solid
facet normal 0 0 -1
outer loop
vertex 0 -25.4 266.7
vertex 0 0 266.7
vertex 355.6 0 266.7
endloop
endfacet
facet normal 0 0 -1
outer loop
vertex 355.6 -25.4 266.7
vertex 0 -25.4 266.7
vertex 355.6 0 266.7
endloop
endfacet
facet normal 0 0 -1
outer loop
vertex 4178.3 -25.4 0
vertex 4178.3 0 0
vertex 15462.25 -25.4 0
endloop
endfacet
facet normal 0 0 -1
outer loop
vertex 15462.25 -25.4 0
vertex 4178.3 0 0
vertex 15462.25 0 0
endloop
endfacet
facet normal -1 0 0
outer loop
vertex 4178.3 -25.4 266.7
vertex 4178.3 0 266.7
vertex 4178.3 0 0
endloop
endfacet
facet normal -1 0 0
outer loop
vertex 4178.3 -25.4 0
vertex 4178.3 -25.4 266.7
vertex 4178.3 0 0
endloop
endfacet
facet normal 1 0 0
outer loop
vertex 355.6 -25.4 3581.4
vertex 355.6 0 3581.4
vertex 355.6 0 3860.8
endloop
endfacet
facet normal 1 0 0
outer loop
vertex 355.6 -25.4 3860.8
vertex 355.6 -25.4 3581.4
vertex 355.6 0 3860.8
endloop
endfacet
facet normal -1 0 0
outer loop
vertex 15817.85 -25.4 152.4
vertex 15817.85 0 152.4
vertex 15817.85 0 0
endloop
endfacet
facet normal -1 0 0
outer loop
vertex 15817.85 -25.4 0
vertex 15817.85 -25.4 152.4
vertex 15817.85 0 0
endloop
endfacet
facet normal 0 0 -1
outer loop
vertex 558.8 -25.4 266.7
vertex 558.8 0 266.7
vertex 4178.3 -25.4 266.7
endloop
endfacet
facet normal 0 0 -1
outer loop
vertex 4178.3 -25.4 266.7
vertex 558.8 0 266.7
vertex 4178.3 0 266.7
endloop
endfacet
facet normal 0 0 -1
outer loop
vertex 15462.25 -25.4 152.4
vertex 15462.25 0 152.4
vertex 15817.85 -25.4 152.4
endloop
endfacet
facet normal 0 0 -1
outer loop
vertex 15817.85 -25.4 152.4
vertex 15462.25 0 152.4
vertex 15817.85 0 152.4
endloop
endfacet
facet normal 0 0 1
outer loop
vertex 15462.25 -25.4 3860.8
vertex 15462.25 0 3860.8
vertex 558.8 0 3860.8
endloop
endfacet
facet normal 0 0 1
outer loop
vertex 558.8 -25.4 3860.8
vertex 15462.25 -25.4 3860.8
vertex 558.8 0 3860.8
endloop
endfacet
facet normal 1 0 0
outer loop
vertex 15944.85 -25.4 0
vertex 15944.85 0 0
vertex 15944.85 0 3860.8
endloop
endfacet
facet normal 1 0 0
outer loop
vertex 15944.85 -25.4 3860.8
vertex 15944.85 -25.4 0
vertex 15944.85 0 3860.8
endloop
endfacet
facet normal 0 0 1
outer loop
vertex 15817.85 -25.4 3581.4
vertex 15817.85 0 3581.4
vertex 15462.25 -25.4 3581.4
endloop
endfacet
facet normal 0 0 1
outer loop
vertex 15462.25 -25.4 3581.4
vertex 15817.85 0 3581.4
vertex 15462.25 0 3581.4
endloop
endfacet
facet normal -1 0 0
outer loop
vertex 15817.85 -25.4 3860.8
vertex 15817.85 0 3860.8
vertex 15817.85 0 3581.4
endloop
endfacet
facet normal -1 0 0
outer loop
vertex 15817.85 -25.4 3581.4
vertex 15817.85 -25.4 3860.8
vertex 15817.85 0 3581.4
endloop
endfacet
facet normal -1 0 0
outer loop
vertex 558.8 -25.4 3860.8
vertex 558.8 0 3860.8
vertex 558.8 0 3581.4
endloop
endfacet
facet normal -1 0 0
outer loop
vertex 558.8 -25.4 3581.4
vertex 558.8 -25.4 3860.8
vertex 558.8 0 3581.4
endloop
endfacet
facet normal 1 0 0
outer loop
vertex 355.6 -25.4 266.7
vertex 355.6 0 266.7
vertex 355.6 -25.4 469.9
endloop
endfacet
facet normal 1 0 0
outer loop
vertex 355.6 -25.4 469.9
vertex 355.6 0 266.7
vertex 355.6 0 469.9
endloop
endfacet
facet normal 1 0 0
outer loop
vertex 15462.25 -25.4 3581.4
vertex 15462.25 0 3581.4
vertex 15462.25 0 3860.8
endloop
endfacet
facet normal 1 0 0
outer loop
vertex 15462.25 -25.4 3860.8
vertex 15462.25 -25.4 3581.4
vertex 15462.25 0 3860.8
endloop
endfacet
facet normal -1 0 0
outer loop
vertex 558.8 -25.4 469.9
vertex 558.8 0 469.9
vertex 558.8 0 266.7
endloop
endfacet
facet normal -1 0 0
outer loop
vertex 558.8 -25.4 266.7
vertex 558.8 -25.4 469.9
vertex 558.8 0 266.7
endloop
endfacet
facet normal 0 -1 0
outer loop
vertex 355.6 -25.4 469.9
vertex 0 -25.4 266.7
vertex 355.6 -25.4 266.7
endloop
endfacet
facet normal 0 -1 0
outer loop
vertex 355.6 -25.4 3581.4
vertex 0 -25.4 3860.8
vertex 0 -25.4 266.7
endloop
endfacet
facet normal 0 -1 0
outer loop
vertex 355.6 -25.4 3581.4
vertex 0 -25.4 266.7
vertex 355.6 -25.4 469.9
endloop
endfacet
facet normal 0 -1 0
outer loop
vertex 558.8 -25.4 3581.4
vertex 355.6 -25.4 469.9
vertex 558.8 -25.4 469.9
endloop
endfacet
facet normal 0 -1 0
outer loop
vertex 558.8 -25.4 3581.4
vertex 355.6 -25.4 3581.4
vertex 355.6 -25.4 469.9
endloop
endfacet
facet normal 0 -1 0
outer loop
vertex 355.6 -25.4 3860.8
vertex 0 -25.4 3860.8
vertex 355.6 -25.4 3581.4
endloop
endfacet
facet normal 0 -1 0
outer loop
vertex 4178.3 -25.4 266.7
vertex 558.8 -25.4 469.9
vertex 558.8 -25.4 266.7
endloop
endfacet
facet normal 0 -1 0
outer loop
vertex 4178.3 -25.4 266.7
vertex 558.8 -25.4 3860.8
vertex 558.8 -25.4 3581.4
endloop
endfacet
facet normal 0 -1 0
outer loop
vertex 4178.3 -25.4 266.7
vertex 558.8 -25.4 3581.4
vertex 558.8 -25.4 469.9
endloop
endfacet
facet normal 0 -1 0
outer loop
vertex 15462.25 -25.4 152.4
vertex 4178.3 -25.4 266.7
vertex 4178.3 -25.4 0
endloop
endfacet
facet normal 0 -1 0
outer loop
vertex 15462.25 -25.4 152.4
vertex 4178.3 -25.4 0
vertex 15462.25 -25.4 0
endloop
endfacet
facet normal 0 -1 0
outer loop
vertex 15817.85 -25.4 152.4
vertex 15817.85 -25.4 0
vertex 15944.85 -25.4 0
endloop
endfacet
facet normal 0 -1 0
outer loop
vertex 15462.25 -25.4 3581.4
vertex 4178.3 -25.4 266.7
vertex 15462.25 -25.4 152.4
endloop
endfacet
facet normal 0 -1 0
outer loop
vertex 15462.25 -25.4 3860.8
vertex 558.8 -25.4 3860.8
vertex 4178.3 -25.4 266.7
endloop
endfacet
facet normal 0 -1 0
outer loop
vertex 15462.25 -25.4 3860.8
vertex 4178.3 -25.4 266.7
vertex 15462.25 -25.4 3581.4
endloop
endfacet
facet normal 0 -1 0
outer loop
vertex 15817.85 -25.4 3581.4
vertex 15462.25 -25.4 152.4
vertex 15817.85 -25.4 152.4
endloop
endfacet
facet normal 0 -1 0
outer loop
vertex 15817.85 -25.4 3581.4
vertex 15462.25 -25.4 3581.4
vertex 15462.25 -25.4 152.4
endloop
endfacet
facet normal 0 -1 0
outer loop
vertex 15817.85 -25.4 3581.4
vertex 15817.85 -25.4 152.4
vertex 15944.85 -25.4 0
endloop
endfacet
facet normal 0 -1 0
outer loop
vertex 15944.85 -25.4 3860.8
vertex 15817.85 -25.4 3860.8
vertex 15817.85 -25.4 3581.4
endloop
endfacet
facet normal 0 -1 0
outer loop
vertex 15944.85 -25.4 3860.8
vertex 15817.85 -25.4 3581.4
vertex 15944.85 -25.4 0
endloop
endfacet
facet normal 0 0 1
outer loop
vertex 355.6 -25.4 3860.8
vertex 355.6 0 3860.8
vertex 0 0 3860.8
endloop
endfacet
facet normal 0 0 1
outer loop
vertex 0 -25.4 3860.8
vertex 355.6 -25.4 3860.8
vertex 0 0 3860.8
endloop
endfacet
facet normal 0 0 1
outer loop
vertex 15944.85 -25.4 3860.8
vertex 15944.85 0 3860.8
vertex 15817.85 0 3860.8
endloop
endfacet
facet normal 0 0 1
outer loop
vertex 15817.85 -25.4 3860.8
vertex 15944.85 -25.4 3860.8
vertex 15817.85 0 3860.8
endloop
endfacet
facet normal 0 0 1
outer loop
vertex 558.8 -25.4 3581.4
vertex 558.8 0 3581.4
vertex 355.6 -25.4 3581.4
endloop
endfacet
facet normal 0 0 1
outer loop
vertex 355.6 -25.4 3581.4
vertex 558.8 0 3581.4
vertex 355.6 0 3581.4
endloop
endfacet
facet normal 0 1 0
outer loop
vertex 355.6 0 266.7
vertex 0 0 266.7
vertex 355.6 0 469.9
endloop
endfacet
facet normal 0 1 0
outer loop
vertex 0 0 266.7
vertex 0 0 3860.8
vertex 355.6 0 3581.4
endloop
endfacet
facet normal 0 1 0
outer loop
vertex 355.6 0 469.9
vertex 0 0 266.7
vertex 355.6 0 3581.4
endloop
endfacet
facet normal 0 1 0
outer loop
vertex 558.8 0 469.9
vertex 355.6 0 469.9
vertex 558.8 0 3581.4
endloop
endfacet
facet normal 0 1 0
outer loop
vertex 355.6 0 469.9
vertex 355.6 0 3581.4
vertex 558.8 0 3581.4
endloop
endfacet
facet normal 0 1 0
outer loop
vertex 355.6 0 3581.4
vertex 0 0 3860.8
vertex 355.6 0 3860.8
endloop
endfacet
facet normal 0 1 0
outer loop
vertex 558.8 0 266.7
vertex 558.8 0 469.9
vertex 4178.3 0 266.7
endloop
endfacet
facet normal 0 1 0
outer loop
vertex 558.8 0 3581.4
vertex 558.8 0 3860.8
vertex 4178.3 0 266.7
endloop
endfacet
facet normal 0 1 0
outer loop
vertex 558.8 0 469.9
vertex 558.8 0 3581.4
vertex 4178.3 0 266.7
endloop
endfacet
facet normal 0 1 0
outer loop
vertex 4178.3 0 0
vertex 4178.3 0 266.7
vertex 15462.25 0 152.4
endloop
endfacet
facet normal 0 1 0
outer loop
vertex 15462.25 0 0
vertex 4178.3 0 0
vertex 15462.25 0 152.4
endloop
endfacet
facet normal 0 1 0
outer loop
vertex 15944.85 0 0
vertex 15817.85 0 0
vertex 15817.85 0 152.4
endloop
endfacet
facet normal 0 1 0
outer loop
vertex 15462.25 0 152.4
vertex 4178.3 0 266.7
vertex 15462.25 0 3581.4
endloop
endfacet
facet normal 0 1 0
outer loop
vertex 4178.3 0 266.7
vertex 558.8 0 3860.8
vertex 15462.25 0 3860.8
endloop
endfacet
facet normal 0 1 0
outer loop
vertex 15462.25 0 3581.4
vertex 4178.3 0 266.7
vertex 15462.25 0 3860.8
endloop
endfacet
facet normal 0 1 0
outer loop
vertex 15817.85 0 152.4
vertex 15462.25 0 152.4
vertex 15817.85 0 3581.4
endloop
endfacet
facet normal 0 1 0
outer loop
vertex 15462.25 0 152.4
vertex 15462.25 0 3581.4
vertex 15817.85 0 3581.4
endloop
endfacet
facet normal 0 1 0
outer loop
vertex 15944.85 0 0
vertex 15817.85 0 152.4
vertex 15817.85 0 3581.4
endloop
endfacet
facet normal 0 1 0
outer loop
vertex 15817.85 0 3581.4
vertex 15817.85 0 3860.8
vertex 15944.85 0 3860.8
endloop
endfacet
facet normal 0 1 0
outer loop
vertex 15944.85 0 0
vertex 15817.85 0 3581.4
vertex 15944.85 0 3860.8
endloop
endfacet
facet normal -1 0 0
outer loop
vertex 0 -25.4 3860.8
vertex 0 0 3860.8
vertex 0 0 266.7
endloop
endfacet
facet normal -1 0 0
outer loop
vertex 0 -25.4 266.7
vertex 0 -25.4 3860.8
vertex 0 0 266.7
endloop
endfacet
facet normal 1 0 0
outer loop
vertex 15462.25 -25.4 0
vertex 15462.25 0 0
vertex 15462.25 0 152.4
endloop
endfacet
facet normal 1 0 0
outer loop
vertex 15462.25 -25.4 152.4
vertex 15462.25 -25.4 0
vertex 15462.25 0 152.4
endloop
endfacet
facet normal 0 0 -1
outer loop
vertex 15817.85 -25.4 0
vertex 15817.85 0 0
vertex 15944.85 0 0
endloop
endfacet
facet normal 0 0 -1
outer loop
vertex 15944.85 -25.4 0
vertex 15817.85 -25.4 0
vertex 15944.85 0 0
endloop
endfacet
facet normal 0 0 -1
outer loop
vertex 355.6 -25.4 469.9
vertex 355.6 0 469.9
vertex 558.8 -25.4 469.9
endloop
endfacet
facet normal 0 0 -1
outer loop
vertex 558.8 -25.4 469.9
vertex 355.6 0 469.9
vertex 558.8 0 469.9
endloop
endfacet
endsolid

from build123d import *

# Parameters (mm, degrees)
F1_DEPTH = 25.4


with BuildPart() as f1:
    # F0 (on Front) → F1 (new body)
    with BuildSketch(Plane.XZ):
        Polygon((355.6, 3860.8), (0, 3860.8), (0, 266.7), (355.6, 266.7), (355.6, 469.9), (558.8, 469.9), (558.8, 266.7), (4178.3, 266.7), (4178.3, 0), (15462.25, 0), (15462.25, 152.4), (15817.85, 152.4), (15817.85, 0), (15944.85, 0), (15944.85, 3860.8), (15817.85, 3860.8), (15817.85, 3581.4), (15462.25, 3581.4), (15462.25, 3860.8), (558.8, 3860.8), (558.8, 3581.4), (355.6, 3581.4), align=None)
    extrude(amount=F1_DEPTH)


solid = f1.part
